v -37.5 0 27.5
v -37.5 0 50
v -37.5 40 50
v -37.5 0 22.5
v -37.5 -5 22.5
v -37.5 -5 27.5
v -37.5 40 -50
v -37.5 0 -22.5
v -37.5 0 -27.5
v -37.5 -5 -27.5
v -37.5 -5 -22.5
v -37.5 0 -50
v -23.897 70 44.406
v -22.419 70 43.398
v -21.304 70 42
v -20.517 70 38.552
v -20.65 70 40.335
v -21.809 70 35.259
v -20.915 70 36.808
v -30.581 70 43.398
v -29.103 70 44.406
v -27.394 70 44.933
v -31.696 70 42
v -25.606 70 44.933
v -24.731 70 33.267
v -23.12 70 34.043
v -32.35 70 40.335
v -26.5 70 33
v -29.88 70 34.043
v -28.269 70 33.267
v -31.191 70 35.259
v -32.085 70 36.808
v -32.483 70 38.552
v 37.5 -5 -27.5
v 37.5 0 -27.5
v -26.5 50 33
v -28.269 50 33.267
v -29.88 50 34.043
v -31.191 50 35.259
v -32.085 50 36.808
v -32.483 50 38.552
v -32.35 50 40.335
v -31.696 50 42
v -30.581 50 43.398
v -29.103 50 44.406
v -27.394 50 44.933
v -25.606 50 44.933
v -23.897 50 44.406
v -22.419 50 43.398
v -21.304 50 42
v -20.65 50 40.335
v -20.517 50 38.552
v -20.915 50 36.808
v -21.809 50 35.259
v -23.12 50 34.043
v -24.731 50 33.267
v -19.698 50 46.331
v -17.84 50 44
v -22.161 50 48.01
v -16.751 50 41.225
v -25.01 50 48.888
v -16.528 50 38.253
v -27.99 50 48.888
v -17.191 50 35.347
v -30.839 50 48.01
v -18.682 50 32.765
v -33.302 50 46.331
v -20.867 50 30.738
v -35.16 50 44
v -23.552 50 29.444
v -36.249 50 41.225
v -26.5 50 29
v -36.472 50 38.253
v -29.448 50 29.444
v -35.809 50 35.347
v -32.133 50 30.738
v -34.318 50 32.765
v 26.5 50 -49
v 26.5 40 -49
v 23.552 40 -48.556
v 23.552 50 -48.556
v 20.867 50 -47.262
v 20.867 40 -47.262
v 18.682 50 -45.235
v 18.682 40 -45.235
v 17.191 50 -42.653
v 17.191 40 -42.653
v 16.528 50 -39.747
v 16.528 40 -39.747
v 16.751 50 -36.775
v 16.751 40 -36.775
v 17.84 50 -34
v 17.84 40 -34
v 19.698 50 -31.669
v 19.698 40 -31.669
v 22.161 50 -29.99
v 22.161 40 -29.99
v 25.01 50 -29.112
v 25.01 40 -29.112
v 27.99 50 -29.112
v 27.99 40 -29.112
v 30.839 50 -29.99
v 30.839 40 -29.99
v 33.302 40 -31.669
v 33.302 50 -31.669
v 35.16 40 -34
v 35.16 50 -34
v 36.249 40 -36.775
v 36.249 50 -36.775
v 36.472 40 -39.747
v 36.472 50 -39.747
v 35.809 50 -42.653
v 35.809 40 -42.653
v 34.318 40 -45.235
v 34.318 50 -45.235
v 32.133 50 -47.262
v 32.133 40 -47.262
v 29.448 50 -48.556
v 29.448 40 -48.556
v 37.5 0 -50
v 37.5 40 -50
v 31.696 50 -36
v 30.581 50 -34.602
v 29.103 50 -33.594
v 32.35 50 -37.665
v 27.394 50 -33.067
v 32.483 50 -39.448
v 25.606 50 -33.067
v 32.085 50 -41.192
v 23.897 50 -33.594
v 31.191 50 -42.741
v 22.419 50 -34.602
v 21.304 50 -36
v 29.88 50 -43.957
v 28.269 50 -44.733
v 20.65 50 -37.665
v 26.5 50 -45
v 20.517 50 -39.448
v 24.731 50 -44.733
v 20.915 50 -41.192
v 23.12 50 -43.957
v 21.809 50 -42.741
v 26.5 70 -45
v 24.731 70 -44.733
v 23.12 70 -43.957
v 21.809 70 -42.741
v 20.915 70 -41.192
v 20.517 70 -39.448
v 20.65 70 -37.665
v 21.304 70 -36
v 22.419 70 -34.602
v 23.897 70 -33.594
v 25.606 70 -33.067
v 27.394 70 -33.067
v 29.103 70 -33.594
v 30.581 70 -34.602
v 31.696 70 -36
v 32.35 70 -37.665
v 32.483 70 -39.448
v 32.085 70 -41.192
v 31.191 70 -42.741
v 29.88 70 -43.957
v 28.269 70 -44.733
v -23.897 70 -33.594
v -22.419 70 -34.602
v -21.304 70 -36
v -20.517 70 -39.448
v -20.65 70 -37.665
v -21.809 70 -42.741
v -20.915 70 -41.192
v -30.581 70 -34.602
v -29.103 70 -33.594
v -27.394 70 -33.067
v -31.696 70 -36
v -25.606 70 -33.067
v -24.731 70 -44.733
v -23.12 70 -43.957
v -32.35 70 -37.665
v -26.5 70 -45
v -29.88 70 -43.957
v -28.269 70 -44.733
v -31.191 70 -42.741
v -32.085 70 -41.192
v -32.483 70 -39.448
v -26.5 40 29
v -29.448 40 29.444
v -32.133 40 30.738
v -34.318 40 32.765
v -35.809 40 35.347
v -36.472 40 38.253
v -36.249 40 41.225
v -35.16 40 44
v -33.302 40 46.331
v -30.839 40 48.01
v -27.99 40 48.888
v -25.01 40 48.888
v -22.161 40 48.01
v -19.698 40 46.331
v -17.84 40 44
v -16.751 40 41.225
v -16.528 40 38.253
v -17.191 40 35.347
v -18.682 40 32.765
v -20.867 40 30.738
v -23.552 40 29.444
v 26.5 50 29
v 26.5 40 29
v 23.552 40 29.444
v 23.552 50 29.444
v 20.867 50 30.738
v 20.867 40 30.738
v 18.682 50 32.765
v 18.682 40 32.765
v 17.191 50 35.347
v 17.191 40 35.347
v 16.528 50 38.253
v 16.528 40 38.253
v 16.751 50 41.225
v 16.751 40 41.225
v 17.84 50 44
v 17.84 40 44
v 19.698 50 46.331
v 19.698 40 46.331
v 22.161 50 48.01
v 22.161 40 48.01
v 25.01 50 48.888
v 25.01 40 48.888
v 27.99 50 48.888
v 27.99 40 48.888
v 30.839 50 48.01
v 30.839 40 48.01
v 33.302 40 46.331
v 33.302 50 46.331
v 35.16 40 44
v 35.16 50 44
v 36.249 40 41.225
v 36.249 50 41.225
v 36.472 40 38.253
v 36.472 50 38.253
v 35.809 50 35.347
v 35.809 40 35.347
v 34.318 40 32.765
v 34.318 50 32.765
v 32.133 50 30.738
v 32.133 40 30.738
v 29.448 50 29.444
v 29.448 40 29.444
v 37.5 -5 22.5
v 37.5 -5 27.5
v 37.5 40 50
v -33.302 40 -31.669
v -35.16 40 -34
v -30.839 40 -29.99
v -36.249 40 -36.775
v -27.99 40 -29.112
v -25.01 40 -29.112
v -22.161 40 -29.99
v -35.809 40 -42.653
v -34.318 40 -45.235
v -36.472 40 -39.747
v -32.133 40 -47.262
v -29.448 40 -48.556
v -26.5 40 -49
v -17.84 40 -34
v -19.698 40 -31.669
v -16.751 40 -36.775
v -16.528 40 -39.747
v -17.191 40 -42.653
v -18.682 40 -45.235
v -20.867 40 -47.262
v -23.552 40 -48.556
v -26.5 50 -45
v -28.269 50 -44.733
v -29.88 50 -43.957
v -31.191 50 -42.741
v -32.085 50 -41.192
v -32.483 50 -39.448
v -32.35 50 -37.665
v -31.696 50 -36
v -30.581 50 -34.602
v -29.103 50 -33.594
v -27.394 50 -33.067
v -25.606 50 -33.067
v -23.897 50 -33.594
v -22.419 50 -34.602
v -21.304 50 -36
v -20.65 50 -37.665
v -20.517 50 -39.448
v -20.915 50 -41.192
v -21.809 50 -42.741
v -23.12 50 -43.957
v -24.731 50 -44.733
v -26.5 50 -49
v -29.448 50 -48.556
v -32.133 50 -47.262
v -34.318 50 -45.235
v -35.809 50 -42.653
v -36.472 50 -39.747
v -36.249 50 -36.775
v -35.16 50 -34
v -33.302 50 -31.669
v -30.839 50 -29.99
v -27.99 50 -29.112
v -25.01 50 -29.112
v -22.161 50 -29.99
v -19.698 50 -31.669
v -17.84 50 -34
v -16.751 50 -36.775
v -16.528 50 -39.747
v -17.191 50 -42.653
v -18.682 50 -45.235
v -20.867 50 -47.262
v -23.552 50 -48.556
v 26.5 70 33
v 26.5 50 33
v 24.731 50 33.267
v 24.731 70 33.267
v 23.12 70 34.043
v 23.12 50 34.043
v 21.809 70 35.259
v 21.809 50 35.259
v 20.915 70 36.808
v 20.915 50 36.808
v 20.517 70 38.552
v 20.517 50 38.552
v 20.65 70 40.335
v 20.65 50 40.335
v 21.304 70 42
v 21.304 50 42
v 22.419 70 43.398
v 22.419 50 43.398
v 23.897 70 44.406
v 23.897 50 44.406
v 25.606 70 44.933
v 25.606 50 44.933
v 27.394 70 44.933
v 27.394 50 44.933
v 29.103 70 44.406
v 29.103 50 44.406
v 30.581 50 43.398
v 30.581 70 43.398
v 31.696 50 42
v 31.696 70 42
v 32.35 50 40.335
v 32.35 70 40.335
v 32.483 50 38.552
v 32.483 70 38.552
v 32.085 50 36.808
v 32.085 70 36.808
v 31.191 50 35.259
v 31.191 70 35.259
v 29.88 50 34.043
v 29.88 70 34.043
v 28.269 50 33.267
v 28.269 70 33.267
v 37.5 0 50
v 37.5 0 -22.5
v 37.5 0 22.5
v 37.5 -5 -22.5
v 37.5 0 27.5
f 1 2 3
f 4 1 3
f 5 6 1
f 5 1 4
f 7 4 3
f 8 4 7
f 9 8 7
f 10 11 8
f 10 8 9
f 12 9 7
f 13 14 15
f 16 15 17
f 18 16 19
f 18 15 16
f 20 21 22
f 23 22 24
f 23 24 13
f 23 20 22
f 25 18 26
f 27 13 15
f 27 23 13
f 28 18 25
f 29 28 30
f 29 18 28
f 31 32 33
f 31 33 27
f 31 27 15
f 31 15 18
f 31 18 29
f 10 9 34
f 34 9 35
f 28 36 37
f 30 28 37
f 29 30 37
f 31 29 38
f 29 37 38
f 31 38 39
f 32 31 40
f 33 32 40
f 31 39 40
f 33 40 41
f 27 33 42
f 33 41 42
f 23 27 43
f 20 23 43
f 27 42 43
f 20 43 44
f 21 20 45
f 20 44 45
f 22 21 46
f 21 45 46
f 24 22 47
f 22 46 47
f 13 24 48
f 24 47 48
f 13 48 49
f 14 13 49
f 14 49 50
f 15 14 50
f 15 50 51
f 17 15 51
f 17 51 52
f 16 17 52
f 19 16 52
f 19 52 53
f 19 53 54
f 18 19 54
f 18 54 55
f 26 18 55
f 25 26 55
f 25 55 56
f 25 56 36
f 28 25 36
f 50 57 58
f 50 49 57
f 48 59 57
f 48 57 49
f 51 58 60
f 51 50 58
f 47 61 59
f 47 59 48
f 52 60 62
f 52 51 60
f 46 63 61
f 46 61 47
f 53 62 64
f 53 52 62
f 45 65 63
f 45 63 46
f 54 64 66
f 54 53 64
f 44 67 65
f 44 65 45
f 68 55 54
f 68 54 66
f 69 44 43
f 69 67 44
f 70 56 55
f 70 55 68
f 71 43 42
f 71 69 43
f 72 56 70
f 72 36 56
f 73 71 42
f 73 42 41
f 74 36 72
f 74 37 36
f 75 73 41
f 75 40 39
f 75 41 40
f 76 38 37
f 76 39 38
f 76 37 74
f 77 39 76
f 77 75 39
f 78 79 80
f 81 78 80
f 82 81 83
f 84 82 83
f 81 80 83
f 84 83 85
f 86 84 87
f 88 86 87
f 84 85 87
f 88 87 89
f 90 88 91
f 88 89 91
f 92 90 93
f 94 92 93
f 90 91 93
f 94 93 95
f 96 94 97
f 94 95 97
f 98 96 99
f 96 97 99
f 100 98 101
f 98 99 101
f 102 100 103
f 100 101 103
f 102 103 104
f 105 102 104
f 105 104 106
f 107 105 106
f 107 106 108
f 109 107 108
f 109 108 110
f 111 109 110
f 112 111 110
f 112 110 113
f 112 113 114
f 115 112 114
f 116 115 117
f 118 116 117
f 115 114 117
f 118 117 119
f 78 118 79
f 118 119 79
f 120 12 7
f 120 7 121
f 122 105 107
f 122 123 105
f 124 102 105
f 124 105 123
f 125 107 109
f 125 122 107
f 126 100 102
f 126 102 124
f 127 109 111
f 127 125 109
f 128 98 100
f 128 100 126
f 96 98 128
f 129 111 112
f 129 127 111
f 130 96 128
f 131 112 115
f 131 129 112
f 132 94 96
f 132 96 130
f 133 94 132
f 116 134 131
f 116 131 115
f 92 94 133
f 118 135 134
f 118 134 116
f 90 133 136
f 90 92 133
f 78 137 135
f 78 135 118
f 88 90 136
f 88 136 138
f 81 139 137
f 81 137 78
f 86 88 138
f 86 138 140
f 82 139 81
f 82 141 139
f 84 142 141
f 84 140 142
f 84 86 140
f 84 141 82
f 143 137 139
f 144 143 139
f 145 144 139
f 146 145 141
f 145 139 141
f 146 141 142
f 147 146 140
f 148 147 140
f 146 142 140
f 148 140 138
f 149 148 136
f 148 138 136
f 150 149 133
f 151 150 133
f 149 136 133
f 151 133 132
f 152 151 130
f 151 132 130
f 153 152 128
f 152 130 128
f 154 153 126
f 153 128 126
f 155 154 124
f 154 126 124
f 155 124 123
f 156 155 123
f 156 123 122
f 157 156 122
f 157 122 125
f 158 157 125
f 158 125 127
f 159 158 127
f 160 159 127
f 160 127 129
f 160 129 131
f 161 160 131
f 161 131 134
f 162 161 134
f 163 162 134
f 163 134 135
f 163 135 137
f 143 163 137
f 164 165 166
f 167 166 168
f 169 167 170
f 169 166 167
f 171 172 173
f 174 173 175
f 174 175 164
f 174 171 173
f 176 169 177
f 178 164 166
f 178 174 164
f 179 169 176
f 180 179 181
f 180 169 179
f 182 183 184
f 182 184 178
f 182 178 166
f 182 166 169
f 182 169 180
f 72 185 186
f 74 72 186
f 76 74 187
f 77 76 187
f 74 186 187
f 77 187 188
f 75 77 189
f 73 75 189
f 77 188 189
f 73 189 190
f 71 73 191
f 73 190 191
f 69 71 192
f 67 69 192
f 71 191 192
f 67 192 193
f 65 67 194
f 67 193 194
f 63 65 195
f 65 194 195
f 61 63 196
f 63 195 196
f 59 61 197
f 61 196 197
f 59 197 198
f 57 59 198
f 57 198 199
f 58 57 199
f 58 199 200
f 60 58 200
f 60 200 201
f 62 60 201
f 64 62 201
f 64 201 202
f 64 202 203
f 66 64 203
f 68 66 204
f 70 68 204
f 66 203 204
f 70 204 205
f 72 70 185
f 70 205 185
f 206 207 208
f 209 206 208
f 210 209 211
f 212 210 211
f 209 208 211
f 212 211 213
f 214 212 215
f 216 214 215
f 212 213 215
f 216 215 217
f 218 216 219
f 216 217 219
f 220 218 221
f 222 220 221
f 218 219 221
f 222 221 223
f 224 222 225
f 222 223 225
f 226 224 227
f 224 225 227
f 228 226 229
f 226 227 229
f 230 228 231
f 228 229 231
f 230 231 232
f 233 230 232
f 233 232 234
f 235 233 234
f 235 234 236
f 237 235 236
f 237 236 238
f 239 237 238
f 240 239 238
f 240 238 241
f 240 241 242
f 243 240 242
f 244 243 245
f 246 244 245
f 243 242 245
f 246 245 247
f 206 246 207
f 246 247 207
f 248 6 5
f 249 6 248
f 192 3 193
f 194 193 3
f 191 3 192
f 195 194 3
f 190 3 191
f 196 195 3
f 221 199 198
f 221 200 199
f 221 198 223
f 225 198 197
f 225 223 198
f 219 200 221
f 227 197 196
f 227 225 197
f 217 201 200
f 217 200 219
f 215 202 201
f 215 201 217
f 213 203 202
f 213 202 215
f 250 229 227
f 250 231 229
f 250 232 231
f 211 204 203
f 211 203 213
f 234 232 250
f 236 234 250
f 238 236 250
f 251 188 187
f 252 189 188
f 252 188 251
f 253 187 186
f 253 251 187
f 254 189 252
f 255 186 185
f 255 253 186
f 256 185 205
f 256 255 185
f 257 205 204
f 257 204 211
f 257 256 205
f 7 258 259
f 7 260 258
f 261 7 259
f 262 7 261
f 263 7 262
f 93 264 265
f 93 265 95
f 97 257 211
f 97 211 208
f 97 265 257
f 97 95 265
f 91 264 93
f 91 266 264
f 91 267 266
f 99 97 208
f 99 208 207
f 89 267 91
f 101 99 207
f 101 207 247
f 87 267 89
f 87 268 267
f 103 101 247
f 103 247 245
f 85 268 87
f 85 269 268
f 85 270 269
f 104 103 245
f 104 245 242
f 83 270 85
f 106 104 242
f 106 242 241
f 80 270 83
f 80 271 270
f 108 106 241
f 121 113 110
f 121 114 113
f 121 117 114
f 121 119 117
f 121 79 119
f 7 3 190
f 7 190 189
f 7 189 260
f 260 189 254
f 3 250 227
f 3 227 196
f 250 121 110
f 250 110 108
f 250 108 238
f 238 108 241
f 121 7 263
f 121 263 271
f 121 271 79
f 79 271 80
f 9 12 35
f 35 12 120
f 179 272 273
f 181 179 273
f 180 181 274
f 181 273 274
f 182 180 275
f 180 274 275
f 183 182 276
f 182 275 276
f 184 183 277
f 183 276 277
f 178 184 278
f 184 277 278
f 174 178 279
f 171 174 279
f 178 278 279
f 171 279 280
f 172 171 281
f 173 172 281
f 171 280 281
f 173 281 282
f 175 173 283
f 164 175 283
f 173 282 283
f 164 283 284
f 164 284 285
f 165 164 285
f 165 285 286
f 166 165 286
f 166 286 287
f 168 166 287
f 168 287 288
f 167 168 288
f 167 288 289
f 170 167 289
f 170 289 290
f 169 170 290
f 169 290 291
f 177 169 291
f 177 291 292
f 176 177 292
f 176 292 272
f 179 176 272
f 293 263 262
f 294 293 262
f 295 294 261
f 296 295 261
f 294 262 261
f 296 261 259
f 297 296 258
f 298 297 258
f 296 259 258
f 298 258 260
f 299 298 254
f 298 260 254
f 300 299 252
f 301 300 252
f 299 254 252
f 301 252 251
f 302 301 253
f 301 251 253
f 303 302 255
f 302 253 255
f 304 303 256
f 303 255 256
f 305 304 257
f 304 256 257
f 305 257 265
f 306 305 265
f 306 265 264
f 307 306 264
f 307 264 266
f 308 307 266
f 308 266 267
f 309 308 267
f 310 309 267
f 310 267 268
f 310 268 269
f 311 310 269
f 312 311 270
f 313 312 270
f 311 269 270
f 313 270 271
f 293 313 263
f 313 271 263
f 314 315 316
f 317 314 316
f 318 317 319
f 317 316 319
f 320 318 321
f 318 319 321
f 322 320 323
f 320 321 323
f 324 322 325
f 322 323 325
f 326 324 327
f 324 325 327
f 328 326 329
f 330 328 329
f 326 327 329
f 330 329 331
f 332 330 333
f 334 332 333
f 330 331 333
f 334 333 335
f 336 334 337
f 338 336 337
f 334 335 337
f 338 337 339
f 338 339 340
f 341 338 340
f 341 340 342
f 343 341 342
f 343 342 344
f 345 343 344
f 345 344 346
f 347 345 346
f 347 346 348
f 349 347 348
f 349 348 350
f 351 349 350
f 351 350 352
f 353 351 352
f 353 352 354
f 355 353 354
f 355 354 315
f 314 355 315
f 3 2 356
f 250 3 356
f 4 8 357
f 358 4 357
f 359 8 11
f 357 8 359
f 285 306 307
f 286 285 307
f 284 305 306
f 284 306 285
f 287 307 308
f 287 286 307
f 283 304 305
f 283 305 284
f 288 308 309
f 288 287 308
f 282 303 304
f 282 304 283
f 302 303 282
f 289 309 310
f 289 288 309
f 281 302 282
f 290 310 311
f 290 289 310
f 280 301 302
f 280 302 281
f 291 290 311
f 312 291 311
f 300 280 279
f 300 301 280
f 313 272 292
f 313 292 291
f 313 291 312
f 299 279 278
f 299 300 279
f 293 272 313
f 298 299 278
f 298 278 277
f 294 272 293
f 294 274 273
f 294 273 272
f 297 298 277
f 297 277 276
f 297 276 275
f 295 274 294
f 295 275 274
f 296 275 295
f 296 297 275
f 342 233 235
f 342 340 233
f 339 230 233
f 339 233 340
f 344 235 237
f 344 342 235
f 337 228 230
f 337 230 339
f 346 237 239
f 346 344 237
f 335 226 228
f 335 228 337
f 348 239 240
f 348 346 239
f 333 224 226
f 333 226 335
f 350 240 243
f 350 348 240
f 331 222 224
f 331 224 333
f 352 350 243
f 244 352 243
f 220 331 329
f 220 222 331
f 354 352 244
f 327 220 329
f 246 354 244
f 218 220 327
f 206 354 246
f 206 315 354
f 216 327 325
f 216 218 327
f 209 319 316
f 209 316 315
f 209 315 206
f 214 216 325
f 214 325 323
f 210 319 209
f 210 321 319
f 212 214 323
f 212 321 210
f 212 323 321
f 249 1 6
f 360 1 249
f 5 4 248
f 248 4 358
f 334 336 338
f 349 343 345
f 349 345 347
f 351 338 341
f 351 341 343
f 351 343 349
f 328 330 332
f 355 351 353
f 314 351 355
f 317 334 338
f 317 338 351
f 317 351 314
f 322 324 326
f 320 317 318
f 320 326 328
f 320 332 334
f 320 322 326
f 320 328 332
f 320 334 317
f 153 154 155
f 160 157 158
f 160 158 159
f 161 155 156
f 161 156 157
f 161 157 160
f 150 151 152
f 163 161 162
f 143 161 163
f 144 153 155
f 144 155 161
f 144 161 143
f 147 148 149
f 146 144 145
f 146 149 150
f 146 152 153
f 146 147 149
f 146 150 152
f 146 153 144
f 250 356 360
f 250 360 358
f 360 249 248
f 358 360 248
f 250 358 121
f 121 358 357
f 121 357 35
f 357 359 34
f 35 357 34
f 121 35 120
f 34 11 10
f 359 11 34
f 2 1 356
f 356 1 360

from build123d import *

# Parameters (mm, degrees)
CROQUIS2_W              = 75
CROQUIS2_H              = 100
SALIENTE_EXTRUIR1_DEPTH = 40
CROQUIS3_W              = 75
CROQUIS3_H              = 5
SALIENTE_EXTRUIR2_DEPTH = 5
CROQUIS4_R              = 10
CROQUIS4_R_2            = 6
SALIENTE_EXTRUIR7_DEPTH = 10
CROQUIS9_R              = 6
SALIENTE_EXTRUIR8_DEPTH = 30


with BuildPart() as part:
    # Croquis2 → Saliente-Extruir1 (new body)
    with BuildSketch(Plane(origin=(0, 0, 0), x_dir=(1, 0, 0), z_dir=(0, 1, 0))):
        Rectangle(CROQUIS2_W, CROQUIS2_H)
    extrude(amount=SALIENTE_EXTRUIR1_DEPTH)

    # Croquis3 → Saliente-Extruir2 (add)
    with BuildSketch(Plane.XZ):
        with Locations((0, 25)):
            Rectangle(CROQUIS3_W, CROQUIS3_H)
        with Locations((0, -25)):
            Rectangle(CROQUIS3_W, CROQUIS3_H)
    extrude(amount=SALIENTE_EXTRUIR2_DEPTH)

    # Croquis4 → Saliente-Extruir7 (add)
    # profile 1 of 4: a face of its own
    with BuildSketch(Plane(origin=(0, 40, 0), x_dir=(1, 0, 0), z_dir=(0, 1, 0))):
        with Locations(Location((-26.5, 39, 0), (0, 0, 90))):
            Circle(CROQUIS4_R)
        with Locations(Location((-26.5, 39, 0), (0, 0, 270))):
            Circle(CROQUIS4_R_2, mode=Mode.SUBTRACT)
    # profile 2 of 4: a face of its own
    with BuildSketch(Plane(origin=(0, 40, 0), x_dir=(1, 0, 0), z_dir=(0, 1, 0))):
        with Locations(Location((26.5, 39, 0), (0, 0, 90))):
            Circle(CROQUIS4_R)
        with Locations(Location((26.5, 39, 0), (0, 0, 90))):
            Circle(CROQUIS4_R_2, mode=Mode.SUBTRACT)
    # profile 3 of 4: a face of its own
    with BuildSketch(Plane(origin=(0, 40, 0), x_dir=(1, 0, 0), z_dir=(0, 1, 0))):
        with Locations(Location((26.5, -39, 0), (0, 0, 90))):
            Circle(CROQUIS4_R)
        with Locations(Location((26.5, -39, 0), (0, 0, 270))):
            Circle(CROQUIS4_R_2, mode=Mode.SUBTRACT)
    # profile 4 of 4: a face of its own
    with BuildSketch(Plane(origin=(0, 40, 0), x_dir=(1, 0, 0), z_dir=(0, 1, 0))):
        with Locations(Location((-26.5, -39, 0), (0, 0, 90))):
            Circle(CROQUIS4_R)
        with Locations(Location((-26.5, -39, 0), (0, 0, 90))):
            Circle(CROQUIS4_R_2, mode=Mode.SUBTRACT)
    extrude(amount=SALIENTE_EXTRUIR7_DEPTH)

    # Croquis9 → Saliente-Extruir8 (add)
    with BuildSketch(Plane(origin=(0, 40, 0), x_dir=(1, 0, 0), z_dir=(0, 1, 0))):
        with Locations(Location((-26.5, -39, 0), (0, 0, 90))):
            Circle(CROQUIS9_R)
        with Locations(Location((-26.5, 39, 0), (0, 0, 90))):
            Circle(CROQUIS9_R)
        with Locations(Location((26.5, -39, 0), (0, 0, 90))):
            Circle(CROQUIS9_R)
        with Locations(Location((26.5, 39, 0), (0, 0, 90))):
            Circle(CROQUIS9_R)
    extrude(amount=SALIENTE_EXTRUIR8_DEPTH)


solid = part.part
